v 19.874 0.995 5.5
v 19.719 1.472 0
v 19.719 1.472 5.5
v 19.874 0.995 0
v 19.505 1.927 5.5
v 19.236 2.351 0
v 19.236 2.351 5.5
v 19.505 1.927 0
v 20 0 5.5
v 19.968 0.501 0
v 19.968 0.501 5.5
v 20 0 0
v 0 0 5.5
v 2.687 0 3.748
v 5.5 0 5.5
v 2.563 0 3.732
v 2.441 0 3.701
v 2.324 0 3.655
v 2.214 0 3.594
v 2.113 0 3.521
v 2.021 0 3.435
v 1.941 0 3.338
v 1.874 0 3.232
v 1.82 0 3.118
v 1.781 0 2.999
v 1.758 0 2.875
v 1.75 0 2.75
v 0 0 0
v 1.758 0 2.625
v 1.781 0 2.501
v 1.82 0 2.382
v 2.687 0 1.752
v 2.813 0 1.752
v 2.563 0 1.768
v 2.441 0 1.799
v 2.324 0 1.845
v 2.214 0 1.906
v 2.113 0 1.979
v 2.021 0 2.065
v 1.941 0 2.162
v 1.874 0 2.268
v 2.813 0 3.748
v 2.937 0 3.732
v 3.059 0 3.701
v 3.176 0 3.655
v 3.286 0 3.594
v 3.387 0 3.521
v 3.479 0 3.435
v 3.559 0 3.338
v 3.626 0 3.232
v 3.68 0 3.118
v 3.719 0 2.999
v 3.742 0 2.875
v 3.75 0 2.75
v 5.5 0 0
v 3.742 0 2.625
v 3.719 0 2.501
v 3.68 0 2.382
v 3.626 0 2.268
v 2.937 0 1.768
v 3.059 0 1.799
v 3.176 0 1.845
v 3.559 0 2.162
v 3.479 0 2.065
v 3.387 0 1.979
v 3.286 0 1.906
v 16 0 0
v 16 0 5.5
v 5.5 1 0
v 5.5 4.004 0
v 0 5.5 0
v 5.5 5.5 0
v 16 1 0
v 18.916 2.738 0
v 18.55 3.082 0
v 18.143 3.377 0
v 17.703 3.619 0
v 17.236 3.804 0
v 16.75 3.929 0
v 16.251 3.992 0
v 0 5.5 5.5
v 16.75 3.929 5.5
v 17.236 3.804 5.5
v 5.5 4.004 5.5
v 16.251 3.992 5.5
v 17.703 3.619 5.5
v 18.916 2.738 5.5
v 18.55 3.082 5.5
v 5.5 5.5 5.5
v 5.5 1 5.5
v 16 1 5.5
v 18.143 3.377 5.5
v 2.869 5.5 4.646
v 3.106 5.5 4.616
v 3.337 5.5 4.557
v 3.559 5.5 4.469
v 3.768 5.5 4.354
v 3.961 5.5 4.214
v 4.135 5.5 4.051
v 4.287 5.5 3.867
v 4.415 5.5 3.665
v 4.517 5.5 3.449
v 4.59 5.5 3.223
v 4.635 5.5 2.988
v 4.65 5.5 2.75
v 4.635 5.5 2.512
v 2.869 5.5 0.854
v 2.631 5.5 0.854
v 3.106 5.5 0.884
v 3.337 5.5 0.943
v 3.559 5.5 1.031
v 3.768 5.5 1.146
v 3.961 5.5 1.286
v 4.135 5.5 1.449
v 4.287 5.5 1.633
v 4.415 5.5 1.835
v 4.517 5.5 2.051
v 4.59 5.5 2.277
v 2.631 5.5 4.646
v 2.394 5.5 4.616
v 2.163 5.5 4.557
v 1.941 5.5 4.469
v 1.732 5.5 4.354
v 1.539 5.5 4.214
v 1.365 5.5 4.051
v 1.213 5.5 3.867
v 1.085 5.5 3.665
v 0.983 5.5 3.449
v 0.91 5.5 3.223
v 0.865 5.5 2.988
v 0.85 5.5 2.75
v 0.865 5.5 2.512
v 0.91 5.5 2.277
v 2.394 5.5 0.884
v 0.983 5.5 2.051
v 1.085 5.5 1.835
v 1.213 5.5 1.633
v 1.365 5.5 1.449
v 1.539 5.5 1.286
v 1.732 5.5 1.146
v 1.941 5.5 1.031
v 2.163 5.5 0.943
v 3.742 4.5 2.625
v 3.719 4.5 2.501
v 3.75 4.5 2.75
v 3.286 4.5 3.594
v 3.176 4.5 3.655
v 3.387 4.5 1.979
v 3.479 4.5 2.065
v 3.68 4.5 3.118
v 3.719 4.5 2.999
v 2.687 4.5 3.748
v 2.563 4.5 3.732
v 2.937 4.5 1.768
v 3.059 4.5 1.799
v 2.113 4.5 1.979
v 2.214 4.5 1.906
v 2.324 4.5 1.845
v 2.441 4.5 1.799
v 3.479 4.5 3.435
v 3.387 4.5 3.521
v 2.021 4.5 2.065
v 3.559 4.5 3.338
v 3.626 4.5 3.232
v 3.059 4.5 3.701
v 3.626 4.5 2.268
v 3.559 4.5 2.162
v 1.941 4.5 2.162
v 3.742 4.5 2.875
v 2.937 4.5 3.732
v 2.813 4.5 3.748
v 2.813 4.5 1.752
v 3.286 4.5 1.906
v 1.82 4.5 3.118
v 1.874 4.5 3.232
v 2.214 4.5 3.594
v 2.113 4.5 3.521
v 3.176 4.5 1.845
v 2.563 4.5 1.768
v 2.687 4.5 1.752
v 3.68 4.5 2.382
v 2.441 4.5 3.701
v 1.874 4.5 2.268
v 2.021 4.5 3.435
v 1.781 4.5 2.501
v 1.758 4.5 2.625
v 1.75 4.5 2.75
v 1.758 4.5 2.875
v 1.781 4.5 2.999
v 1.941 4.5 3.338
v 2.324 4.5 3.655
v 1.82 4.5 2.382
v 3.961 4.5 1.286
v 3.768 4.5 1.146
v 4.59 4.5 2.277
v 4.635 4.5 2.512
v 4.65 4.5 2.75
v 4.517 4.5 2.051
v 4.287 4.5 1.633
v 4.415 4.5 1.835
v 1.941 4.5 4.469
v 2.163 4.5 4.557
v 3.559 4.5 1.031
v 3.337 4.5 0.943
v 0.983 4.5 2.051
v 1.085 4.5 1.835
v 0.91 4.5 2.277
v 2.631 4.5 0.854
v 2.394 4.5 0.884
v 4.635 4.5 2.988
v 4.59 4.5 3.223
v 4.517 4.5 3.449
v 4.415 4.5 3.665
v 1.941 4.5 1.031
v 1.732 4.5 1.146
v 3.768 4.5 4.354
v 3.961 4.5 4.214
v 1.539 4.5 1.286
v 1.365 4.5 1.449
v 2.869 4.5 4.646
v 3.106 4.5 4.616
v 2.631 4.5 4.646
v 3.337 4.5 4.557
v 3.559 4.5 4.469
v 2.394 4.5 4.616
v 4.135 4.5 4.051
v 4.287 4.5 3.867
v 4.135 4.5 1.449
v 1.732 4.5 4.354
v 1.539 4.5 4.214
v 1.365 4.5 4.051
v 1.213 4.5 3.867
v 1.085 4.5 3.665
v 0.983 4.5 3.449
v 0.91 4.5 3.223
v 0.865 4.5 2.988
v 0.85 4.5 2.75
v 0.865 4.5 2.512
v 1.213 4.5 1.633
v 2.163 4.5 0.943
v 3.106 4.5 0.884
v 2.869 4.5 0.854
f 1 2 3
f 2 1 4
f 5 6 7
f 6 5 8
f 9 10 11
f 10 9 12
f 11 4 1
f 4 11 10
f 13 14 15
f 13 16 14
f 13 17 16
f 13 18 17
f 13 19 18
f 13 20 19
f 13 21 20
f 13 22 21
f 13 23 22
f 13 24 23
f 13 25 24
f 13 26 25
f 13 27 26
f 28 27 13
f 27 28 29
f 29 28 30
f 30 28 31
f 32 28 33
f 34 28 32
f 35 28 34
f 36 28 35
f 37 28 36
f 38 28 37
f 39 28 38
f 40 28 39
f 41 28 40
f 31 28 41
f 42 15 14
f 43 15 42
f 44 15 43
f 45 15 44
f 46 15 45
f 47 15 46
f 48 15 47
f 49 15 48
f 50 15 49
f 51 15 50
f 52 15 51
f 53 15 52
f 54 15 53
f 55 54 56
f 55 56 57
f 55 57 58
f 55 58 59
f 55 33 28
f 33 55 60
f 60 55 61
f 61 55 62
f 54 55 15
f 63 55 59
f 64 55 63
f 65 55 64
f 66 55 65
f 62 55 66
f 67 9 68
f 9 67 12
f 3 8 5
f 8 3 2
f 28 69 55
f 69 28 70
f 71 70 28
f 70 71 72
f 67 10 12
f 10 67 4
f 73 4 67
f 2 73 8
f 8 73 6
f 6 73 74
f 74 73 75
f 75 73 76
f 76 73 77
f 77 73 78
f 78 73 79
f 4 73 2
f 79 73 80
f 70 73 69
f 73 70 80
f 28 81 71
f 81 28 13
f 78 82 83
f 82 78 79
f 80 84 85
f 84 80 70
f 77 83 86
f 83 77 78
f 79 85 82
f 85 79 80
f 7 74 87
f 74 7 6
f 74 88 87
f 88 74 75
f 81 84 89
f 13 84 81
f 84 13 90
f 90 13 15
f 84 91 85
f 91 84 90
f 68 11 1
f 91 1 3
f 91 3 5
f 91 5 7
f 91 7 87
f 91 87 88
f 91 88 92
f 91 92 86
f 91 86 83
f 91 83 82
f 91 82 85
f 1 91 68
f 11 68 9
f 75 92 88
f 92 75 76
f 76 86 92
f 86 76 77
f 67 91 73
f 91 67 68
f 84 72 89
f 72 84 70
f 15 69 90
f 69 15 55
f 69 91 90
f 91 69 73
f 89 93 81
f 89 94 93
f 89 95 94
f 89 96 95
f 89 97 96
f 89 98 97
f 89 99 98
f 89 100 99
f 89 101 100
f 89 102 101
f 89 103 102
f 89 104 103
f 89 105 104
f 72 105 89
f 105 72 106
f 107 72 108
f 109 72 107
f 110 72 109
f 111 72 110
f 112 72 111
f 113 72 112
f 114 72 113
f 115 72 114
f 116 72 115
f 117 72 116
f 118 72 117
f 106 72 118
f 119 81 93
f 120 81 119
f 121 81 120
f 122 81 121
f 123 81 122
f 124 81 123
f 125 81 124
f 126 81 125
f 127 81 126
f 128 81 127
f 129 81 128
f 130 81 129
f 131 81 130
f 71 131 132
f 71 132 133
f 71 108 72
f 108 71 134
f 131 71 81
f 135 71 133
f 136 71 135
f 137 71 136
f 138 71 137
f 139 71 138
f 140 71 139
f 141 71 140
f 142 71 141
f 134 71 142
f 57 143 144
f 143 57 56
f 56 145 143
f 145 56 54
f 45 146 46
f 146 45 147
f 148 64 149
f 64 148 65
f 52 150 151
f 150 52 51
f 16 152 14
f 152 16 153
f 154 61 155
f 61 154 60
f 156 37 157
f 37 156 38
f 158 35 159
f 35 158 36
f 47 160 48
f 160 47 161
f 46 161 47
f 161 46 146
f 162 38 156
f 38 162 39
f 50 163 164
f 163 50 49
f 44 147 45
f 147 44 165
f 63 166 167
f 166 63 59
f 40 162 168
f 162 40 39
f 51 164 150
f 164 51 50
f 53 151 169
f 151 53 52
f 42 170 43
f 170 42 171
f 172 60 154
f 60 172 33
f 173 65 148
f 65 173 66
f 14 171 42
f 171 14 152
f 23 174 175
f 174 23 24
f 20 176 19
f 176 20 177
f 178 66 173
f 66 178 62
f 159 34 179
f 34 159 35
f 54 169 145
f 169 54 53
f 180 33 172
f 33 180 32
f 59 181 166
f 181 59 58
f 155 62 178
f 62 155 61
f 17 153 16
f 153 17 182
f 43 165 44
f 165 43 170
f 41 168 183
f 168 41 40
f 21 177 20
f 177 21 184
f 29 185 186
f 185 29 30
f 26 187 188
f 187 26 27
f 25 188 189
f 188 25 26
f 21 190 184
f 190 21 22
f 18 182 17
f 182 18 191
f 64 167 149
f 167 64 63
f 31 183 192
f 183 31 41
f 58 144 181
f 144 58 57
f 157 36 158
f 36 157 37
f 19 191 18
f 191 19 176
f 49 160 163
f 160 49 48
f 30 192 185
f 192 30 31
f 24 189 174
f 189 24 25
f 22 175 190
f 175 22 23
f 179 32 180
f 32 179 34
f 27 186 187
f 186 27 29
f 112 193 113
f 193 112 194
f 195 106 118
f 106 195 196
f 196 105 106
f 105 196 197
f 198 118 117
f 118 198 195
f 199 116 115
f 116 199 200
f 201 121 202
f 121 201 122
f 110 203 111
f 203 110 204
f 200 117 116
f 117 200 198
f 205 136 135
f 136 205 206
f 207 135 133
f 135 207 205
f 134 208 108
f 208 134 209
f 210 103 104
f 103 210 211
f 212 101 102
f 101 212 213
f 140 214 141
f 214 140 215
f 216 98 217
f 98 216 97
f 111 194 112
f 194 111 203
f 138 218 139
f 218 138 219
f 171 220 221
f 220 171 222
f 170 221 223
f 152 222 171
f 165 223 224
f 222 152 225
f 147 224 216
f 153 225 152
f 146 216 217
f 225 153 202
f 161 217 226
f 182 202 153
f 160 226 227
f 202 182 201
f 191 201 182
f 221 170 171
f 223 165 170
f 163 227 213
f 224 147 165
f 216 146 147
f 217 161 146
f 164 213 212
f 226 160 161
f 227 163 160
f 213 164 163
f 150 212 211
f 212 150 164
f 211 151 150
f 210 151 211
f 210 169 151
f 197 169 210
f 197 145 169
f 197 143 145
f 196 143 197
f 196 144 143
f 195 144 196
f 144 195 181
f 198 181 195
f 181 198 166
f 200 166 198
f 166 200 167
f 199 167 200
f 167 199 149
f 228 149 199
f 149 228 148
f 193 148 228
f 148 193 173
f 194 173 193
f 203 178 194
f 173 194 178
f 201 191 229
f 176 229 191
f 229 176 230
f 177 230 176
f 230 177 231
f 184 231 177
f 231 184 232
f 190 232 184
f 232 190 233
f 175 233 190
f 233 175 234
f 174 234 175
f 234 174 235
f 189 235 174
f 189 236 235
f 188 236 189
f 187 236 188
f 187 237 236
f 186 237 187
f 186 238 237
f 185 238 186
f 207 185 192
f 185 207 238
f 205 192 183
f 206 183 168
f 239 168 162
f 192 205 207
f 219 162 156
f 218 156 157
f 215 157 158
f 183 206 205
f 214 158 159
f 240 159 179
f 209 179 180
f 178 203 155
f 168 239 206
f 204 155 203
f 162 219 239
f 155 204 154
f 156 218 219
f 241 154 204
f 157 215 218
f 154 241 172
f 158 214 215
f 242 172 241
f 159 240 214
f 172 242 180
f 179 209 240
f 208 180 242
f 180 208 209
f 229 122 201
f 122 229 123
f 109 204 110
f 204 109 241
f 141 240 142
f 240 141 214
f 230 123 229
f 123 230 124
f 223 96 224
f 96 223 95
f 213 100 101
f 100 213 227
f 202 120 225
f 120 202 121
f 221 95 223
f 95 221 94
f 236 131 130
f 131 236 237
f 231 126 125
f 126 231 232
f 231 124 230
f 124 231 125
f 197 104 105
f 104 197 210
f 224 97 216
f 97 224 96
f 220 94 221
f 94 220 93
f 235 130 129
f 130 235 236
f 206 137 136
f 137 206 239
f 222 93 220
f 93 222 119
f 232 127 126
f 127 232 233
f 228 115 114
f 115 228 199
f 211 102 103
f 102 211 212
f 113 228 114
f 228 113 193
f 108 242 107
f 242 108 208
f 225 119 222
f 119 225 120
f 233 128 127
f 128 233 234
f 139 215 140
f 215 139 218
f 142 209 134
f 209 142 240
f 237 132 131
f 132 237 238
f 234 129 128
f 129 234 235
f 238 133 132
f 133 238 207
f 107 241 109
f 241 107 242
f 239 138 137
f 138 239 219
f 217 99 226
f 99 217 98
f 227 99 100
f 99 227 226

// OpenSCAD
/**
 * Cable holder clips.
 *
 * Made by coredump hackerspace in Rapperswil, Switzerland.
 * CC BY-SA 3.0.
 *
 * Originally published at https://www.youmagine.com/designs/led-strip-holder-nail-clips/
 *
 */
corner_radius = 4;
thickness = 5.5;
base_width = 20;
nail_radius = 1;
nail_head_depth = 1;
nail_head_radius = 1.9;
led_strip_width = 10.5;
led_strip_height = 1;

module base_raw() {
	hull() {
		translate([0, - corner_radius])
			circle(r=0.01, $fn=50);
		translate([0, corner_radius])
			circle(r=0.01, $fn=50);
		translate([base_width - corner_radius, 0])
			circle(r=corner_radius, $fn=50);
	};
};

module led_strip() {
	translate([thickness, 0, 0])
		cube([led_strip_width, led_strip_height, thickness]);
};

// Covers the LED strip
module base() {
	difference() {
		linear_extrude(thickness) intersection() {
			base_raw();
			square([999, 999]);
		};
		led_strip();
	};
};

// Nail goes in here
module nail_socket() {
	difference() {
		cube([thickness, thickness, thickness]);
	};
};

// The nail
module nail() {
	union() {
		// Nail
		rotate(a=[270, 0, 0])
			translate([thickness/2, -thickness/2])
			cylinder(h=thickness + 10, r=nail_radius, $fn=50);
		// Nail head
		translate([0, thickness - nail_head_depth])
			rotate(a=[270, 0, 0])
			translate([thickness/2, -thickness/2])
			cylinder(h=nail_head_depth, r=nail_head_radius, $fn=50);
	};
};

// This is the final stuff
difference() {
	union() {
		base();
		nail_socket();
	};
	nail();
}
